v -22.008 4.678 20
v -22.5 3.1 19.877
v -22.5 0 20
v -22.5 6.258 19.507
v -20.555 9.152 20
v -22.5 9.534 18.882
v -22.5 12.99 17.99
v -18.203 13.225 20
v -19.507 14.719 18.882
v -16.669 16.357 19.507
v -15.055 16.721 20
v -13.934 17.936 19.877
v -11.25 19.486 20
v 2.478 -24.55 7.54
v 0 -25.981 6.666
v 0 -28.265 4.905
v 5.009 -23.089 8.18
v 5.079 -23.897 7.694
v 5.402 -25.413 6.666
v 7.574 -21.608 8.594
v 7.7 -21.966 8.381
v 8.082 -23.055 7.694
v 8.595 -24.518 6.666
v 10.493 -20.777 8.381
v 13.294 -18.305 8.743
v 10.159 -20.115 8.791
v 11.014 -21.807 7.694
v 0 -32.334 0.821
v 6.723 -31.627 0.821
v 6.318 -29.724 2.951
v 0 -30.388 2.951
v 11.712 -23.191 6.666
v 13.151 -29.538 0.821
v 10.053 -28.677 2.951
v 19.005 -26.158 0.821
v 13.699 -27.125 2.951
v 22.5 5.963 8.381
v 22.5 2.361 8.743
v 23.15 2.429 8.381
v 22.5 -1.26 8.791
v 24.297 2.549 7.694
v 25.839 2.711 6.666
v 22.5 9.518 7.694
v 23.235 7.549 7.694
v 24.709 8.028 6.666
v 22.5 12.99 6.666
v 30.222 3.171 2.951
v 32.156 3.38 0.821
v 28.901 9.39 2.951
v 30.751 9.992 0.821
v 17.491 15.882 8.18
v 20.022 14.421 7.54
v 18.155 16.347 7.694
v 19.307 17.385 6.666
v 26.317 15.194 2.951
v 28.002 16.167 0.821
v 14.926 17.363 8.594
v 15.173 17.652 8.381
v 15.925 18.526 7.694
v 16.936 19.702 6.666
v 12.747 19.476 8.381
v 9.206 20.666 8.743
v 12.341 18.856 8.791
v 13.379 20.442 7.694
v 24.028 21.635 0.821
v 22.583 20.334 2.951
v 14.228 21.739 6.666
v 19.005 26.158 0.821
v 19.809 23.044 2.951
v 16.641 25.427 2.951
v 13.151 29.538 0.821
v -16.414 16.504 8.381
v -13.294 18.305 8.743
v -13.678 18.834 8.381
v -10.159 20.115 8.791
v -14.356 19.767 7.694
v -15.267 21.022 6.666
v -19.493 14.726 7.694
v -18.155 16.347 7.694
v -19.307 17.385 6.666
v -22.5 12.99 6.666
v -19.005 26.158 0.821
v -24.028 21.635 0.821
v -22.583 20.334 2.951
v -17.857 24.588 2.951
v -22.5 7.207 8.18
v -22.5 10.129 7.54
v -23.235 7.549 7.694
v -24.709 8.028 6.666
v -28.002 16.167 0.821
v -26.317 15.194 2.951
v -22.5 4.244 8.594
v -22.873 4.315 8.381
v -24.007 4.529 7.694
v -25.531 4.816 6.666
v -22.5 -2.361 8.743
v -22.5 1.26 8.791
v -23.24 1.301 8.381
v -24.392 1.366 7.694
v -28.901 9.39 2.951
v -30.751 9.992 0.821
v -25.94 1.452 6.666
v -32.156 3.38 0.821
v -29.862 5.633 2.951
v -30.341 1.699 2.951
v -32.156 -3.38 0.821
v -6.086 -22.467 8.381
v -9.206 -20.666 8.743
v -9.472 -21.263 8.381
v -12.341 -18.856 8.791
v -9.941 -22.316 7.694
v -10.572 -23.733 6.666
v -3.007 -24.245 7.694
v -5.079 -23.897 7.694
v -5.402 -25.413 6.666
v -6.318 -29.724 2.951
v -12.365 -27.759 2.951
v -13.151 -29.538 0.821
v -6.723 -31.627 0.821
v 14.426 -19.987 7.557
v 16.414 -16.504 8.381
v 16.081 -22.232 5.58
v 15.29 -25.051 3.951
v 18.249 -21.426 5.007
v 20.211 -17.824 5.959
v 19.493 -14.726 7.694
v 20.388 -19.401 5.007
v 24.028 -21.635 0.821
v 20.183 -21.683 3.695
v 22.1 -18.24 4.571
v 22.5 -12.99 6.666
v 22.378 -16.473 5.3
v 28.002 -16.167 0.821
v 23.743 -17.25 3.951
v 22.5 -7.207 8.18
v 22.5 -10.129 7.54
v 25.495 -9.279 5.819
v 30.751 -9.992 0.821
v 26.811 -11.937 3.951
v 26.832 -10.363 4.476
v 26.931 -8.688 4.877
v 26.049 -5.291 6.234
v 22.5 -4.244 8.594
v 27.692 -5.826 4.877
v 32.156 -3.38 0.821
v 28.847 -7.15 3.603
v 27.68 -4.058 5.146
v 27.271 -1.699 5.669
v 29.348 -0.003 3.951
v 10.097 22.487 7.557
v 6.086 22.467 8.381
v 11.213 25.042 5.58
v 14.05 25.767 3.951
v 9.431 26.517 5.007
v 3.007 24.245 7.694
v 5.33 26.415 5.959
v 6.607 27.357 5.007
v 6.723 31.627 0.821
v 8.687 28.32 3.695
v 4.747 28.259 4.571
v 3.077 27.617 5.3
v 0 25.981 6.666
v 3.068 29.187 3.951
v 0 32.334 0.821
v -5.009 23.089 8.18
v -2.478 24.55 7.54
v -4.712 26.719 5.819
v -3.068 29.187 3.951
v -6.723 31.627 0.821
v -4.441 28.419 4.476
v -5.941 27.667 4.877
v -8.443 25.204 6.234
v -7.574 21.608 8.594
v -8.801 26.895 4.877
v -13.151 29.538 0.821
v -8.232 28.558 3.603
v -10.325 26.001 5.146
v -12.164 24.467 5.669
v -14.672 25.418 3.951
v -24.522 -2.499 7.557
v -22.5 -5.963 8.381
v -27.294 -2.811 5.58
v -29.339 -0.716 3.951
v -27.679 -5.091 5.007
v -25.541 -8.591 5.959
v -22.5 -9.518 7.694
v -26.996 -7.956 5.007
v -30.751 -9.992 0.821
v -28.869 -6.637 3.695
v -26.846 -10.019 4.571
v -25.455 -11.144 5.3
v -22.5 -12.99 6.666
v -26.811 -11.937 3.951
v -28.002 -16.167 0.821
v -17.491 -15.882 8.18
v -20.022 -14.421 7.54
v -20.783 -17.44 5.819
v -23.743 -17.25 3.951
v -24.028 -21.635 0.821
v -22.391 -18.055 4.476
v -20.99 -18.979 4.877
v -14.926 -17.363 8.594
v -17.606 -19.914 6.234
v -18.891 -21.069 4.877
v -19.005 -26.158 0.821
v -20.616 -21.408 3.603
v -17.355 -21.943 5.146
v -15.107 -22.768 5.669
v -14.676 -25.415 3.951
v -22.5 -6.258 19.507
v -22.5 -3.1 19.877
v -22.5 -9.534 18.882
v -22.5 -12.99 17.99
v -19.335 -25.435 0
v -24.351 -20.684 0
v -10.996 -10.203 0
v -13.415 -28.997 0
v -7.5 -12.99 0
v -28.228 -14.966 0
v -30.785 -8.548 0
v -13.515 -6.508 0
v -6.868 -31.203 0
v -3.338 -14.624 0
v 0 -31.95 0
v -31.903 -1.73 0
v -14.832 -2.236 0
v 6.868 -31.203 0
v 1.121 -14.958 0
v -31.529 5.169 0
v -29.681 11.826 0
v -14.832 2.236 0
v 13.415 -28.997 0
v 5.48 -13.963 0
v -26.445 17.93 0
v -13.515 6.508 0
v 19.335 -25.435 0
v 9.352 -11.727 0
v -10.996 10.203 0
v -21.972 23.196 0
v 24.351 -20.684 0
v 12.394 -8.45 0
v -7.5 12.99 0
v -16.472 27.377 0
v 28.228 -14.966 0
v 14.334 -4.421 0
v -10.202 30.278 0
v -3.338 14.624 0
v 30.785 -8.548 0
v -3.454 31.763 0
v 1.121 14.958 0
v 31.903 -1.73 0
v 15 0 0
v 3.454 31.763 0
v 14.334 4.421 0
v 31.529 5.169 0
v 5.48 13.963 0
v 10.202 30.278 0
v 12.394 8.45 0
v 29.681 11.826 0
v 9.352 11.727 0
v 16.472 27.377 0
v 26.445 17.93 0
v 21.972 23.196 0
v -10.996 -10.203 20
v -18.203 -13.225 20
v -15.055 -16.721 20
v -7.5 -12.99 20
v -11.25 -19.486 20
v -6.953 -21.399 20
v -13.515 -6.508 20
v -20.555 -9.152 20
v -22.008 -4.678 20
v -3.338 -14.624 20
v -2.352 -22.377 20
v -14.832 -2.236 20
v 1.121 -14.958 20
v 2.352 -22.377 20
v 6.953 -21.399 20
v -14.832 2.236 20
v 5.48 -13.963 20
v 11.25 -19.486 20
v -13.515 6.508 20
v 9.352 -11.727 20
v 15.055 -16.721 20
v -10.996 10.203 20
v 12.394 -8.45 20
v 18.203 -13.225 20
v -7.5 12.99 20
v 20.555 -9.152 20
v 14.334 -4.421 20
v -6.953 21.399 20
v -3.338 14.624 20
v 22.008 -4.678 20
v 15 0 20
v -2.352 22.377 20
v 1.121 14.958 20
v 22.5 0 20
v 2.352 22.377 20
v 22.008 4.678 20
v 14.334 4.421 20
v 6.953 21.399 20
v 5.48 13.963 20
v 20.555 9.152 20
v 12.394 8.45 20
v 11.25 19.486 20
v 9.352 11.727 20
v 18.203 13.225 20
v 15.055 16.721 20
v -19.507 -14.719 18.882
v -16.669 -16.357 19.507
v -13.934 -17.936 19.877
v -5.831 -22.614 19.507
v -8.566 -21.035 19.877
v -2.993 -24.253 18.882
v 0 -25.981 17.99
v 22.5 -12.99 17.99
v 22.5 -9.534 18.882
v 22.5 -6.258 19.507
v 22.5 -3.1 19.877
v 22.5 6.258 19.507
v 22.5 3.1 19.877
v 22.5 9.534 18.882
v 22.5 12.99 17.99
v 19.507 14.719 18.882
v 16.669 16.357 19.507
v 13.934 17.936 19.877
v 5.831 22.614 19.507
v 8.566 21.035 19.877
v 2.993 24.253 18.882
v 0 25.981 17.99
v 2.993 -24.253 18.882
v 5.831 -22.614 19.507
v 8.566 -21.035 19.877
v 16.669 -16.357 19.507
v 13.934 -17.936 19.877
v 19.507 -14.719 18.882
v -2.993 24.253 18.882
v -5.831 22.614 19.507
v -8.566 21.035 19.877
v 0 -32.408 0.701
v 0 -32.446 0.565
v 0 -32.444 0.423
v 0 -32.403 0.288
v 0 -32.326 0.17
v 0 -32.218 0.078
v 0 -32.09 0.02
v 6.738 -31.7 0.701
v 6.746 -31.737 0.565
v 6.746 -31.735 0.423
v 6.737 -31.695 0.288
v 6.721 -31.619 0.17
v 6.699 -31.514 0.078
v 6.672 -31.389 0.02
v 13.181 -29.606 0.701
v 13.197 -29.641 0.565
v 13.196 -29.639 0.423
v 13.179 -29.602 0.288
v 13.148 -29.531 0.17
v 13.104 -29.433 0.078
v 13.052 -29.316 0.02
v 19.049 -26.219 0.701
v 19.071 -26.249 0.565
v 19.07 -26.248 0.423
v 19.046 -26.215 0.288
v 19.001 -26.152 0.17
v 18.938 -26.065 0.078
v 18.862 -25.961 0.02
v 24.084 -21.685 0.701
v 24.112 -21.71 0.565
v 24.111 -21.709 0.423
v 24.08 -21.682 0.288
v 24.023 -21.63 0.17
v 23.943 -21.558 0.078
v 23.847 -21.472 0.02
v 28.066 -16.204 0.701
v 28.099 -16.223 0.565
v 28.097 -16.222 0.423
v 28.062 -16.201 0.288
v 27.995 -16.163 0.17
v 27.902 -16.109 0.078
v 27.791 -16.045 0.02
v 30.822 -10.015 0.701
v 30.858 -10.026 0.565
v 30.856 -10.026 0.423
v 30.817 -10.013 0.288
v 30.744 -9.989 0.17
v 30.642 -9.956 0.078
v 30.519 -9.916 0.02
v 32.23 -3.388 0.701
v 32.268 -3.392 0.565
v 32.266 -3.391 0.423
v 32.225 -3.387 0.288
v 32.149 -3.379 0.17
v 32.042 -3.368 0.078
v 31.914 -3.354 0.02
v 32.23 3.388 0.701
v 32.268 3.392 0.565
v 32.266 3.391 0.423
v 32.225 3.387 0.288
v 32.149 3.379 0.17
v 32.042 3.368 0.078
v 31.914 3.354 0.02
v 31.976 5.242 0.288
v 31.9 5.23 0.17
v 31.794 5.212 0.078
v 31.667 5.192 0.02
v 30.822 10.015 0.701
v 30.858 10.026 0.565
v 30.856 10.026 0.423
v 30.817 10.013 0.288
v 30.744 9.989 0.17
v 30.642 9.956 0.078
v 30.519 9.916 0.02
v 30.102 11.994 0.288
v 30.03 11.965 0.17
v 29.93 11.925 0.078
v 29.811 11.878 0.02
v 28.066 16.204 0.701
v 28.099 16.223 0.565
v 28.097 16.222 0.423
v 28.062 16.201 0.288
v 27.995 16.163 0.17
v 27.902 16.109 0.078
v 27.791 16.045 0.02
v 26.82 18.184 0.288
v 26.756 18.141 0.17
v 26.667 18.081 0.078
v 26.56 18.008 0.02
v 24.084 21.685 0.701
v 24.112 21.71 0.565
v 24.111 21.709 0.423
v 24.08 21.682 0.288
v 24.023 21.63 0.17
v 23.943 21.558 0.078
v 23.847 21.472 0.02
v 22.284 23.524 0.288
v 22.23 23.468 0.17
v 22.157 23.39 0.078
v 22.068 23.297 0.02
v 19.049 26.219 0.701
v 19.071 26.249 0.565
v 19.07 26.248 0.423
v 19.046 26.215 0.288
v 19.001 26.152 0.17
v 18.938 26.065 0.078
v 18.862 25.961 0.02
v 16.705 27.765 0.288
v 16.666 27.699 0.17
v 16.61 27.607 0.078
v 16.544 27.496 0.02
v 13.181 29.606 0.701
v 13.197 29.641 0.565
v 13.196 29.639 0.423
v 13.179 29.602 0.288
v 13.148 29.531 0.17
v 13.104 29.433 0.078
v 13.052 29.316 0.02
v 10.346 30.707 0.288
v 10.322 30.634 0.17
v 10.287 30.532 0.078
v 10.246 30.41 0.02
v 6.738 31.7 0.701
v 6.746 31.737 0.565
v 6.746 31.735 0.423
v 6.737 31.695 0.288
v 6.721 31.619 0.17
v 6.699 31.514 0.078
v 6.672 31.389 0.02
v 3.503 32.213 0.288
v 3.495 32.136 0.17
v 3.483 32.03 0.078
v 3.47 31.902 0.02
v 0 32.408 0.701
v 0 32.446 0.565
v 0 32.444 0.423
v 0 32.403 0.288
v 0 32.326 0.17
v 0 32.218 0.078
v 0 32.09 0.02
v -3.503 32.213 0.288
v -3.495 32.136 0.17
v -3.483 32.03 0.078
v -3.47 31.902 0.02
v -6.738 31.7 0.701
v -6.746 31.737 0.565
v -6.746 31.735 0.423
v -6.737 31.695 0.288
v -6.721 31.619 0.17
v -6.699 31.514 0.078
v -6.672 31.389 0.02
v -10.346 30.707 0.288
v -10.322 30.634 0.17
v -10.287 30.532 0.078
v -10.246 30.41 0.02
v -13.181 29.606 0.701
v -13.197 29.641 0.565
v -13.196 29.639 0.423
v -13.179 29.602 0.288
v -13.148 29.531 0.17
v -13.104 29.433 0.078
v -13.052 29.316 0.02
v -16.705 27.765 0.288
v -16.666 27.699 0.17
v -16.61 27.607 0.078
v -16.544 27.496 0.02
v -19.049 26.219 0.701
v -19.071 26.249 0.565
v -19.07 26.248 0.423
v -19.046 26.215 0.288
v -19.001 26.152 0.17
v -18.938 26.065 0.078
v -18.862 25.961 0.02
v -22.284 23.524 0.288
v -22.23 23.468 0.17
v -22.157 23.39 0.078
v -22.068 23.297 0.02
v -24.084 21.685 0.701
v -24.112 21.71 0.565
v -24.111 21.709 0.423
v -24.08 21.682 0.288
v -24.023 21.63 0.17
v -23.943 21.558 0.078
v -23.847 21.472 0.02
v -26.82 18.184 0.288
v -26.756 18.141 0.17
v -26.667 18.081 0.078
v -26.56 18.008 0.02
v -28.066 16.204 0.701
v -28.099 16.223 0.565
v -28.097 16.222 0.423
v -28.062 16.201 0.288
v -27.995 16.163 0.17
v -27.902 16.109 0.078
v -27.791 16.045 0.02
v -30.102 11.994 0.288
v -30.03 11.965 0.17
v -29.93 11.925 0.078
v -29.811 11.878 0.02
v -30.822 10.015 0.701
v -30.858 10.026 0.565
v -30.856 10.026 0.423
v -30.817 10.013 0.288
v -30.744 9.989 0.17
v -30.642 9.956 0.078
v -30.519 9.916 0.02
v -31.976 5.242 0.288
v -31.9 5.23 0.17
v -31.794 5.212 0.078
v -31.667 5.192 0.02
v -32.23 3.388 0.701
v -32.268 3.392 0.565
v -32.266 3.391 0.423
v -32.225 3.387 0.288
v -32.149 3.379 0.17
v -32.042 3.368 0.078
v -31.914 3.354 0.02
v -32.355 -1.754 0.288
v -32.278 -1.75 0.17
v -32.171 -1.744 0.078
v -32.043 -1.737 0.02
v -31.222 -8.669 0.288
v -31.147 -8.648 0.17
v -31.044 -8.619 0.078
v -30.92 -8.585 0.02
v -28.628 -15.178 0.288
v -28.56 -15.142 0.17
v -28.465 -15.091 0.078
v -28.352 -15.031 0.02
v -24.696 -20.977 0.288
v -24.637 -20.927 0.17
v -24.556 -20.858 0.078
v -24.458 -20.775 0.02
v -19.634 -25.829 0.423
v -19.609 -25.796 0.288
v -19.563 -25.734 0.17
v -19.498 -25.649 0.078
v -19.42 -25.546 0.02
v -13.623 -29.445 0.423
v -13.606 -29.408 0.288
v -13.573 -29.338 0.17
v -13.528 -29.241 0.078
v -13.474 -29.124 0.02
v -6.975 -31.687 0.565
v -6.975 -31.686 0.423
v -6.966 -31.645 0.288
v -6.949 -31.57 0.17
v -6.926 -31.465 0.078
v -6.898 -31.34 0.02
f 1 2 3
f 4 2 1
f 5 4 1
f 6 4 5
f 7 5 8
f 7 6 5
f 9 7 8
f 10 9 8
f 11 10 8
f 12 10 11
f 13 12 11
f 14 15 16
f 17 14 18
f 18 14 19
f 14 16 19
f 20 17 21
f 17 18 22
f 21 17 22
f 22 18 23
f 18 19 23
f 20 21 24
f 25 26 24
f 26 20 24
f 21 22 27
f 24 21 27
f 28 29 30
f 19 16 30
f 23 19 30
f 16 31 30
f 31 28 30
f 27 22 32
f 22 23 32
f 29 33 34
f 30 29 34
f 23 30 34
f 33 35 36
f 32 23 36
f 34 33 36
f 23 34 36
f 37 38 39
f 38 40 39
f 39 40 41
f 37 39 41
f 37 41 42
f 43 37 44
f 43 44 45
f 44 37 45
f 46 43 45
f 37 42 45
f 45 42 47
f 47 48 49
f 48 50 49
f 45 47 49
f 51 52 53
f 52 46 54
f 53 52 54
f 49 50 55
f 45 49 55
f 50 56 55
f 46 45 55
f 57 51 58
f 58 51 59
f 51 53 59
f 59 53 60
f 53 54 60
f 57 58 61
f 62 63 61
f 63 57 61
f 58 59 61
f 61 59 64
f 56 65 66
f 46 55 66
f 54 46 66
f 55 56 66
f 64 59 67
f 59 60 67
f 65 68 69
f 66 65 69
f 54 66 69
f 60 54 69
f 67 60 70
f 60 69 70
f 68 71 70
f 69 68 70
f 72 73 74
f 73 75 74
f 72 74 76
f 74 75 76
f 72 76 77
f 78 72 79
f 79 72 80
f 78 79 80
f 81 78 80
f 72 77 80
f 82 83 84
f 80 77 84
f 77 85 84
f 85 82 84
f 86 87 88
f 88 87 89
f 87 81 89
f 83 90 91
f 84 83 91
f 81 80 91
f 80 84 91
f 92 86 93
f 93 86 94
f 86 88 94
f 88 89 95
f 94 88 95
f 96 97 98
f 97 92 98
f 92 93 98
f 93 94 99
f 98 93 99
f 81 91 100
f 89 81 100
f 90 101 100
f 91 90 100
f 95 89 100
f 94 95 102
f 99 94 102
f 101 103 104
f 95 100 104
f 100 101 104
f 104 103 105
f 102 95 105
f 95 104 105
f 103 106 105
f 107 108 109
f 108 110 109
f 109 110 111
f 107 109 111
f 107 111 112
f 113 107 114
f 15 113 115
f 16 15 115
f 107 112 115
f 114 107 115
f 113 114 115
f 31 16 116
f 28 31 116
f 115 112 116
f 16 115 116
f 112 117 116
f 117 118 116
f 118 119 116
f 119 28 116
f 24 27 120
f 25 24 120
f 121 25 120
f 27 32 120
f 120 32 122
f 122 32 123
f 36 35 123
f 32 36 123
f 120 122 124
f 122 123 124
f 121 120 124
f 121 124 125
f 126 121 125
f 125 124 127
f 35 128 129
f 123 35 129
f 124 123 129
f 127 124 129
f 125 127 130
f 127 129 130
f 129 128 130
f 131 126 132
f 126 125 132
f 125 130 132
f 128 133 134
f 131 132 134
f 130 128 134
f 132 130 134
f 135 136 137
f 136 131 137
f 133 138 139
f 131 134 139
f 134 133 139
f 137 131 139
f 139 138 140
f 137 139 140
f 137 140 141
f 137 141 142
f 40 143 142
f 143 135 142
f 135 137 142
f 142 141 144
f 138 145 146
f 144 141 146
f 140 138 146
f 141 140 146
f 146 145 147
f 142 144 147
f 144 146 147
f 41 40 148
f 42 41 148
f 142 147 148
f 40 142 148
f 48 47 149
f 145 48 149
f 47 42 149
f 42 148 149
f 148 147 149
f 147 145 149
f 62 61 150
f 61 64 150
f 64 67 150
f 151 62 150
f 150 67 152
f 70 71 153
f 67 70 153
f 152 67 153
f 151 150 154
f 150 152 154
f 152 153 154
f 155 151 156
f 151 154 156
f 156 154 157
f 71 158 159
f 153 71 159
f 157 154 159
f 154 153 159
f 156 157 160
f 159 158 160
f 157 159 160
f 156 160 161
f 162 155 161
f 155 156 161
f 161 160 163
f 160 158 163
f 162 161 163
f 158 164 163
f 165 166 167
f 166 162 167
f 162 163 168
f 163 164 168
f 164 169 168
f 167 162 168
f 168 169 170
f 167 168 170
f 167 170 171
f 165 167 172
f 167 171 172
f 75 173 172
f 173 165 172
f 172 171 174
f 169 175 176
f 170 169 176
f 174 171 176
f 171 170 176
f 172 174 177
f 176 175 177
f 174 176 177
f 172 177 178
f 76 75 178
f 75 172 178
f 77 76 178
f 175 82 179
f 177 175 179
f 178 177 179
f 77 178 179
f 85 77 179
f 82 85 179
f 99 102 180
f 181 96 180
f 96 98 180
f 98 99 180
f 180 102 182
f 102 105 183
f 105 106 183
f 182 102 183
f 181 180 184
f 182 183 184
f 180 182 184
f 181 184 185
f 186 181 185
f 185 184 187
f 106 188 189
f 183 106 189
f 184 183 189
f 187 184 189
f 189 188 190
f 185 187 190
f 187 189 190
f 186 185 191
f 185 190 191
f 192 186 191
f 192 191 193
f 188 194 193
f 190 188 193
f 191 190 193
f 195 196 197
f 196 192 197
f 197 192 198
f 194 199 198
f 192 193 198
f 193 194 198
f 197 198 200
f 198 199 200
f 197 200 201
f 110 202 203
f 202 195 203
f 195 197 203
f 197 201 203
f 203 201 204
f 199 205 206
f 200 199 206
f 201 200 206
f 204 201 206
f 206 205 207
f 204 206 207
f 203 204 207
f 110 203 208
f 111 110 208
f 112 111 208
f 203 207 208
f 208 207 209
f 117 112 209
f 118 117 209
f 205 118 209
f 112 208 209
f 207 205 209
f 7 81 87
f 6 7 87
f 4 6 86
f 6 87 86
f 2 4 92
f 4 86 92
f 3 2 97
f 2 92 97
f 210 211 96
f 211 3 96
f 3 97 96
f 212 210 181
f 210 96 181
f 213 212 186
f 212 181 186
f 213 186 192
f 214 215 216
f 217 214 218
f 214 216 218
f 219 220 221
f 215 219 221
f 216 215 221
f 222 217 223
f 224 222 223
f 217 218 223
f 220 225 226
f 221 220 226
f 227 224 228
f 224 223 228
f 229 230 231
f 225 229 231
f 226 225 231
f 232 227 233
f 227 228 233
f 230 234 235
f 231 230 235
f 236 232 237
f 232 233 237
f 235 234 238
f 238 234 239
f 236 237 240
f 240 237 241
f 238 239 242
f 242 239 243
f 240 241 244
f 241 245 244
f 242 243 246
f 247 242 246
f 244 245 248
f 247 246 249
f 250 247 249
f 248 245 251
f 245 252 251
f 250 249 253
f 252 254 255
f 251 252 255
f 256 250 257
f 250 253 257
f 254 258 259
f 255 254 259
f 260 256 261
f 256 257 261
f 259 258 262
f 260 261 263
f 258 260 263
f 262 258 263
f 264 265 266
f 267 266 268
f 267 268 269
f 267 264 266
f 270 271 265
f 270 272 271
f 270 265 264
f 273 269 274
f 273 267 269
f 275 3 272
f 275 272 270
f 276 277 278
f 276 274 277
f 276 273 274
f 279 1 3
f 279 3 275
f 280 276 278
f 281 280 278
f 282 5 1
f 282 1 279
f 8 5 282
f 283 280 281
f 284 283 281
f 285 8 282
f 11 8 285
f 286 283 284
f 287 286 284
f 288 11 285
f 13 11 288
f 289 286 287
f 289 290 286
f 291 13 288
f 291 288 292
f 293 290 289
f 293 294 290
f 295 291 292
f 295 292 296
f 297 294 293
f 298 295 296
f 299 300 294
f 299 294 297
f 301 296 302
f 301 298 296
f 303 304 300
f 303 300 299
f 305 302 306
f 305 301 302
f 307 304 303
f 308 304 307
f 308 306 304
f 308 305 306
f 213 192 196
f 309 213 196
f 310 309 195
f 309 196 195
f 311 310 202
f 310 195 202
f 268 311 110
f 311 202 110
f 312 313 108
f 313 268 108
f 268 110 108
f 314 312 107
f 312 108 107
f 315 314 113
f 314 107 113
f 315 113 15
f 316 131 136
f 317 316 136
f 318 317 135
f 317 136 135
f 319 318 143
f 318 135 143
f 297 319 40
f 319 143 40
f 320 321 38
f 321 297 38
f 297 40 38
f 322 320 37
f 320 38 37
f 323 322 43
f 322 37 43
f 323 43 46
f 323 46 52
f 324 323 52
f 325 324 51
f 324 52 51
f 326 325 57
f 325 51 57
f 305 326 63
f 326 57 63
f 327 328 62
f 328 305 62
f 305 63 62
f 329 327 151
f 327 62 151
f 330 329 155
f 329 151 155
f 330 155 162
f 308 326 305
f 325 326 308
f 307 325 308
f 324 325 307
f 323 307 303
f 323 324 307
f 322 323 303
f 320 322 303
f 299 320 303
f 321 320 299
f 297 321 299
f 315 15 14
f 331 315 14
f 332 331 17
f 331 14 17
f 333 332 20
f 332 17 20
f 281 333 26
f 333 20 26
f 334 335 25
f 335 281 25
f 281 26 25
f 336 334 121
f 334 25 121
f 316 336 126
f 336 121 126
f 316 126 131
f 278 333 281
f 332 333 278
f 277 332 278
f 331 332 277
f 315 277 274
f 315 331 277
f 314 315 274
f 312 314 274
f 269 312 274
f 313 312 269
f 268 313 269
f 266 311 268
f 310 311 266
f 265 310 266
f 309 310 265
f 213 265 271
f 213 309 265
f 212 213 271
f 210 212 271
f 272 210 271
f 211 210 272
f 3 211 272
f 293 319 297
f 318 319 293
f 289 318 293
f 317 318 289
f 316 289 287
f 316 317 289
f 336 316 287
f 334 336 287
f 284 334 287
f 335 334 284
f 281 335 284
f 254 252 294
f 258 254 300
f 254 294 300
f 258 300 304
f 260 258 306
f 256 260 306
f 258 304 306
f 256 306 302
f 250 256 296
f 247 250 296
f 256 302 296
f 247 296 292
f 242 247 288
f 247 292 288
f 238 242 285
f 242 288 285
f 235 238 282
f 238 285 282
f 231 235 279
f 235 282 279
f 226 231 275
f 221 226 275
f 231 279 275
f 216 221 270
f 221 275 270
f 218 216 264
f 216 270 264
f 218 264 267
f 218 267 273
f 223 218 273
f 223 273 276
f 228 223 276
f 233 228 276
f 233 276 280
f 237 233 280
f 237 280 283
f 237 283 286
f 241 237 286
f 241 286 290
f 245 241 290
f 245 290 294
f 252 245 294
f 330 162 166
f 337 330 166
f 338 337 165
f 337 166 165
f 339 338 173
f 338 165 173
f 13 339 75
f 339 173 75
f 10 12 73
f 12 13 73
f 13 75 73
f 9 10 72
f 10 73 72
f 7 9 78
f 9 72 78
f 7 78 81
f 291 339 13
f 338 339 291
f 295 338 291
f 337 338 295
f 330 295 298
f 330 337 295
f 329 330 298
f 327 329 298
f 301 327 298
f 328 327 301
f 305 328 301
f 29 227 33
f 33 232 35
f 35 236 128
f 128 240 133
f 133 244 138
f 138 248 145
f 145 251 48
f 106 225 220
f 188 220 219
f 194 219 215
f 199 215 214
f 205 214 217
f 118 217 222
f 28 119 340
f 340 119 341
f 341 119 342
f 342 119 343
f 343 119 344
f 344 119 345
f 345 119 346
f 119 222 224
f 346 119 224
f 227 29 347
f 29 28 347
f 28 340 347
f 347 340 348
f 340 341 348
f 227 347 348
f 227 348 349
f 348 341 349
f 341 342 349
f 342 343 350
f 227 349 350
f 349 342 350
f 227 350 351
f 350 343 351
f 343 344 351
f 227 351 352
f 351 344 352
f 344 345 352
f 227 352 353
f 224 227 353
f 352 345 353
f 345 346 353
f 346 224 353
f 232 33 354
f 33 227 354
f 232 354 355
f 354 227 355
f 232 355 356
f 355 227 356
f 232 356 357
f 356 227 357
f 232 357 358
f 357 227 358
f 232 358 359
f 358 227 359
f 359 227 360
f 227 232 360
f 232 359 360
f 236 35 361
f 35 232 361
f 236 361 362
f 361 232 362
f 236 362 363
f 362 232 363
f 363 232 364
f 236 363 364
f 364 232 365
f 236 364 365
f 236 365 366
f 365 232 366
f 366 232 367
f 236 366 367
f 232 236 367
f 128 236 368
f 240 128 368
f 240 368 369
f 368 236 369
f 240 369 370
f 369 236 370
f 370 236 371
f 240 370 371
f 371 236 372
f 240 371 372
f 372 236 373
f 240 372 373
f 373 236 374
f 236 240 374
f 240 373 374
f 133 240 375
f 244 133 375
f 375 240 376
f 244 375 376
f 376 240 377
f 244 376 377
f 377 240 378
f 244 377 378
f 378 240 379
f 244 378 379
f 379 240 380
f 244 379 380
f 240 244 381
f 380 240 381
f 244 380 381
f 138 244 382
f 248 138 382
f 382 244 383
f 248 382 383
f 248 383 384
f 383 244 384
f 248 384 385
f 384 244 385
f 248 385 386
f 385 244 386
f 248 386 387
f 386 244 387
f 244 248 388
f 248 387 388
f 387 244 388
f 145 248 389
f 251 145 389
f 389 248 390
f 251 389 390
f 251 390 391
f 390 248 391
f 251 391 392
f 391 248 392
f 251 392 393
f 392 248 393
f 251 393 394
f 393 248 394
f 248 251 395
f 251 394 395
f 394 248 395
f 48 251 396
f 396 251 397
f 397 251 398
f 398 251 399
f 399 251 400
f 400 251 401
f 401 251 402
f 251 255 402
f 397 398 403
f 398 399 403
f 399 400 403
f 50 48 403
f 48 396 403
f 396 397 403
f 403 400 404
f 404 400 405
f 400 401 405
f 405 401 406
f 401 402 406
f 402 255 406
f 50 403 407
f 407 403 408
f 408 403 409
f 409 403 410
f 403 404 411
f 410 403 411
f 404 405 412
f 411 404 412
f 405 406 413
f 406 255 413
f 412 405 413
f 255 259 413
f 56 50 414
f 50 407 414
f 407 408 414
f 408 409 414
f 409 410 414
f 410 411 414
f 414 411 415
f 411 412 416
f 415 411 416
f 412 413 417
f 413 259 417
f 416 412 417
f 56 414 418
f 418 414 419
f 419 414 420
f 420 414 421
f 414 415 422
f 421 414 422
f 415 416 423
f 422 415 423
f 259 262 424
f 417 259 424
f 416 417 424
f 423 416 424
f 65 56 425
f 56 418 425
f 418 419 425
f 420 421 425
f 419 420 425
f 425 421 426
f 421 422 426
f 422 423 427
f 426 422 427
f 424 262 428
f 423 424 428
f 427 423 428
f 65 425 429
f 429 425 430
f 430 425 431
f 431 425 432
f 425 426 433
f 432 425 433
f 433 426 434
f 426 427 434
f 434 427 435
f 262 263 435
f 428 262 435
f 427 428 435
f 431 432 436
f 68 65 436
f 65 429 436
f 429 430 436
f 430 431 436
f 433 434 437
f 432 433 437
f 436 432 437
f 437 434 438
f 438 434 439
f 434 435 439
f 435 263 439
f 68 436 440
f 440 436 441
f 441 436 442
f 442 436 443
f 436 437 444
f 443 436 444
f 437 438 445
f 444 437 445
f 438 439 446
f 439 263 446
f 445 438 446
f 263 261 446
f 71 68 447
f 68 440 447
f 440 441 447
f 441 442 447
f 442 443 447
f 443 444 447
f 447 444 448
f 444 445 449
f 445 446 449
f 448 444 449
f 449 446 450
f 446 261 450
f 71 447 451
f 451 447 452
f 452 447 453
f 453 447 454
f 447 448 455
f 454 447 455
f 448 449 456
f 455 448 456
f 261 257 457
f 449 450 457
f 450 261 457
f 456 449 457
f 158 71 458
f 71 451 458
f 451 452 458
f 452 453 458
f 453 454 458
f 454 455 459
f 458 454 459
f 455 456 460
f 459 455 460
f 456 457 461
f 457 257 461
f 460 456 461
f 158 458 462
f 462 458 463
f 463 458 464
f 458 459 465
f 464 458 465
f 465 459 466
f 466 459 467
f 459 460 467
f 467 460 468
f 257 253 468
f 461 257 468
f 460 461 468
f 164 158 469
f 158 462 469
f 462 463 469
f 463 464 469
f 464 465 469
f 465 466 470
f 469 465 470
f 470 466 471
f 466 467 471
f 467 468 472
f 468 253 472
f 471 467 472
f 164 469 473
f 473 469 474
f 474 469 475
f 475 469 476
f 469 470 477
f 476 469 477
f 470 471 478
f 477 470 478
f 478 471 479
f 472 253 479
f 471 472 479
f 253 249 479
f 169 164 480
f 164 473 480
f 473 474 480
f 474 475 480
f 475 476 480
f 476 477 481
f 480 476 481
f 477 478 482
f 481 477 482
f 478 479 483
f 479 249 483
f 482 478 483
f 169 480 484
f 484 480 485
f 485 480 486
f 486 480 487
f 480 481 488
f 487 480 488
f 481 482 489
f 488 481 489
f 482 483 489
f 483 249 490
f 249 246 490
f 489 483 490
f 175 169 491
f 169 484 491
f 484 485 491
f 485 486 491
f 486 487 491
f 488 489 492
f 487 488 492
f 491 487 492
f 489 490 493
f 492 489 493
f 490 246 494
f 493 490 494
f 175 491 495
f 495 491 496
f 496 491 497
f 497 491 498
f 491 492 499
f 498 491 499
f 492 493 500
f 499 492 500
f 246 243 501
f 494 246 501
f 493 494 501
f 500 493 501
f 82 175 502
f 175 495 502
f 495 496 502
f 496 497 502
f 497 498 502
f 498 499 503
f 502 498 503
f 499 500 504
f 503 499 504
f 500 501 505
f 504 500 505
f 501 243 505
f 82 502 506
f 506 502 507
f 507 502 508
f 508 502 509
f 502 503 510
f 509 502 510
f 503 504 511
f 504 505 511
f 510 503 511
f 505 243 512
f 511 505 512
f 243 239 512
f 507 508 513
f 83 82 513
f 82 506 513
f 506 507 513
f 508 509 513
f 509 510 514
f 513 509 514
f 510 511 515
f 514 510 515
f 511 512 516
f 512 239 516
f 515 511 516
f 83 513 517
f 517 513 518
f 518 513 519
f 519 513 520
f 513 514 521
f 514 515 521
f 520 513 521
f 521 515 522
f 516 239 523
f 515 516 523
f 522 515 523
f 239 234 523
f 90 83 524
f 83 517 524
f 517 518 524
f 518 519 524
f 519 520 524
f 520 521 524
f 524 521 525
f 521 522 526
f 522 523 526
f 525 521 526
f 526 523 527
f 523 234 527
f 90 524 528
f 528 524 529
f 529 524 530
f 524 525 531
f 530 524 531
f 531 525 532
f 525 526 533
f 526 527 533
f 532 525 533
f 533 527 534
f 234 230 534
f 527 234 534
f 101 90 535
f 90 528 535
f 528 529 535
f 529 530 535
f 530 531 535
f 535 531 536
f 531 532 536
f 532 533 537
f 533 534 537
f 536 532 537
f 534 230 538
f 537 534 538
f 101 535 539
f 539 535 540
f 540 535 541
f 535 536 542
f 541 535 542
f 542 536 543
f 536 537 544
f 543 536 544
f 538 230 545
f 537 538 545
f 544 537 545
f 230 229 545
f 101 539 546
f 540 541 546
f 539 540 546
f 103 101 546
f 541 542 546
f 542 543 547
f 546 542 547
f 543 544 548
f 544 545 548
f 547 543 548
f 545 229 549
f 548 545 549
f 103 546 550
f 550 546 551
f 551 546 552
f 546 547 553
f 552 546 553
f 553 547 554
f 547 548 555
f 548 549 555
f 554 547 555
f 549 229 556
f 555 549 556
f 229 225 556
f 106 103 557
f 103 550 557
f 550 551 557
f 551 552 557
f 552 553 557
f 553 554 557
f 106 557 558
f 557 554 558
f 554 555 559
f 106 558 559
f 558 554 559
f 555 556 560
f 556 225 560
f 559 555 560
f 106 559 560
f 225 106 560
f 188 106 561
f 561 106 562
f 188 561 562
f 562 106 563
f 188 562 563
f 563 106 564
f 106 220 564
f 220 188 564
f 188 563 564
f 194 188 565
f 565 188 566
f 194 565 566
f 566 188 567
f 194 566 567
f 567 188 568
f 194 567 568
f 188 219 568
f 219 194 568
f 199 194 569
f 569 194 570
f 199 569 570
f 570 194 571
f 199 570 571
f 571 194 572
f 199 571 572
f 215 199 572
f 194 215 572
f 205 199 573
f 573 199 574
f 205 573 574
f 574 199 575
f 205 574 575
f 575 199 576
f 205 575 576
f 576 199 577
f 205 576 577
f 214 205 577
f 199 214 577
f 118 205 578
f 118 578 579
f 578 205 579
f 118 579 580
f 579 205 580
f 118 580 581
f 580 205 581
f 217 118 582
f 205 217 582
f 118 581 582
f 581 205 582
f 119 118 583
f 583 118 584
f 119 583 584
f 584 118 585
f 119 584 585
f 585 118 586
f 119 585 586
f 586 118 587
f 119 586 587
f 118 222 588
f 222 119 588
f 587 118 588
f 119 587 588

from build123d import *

# Parameters (mm, degrees)
BOSS_EXTRUDE1_DEPTH = 20
SKETCH5_OUTSIDE_W   = 154.97
SKETCH5_OUTSIDE_H   = 154.97
SKETCH5_OUTSIDE_R   = 22.5
CUT_EXTRUDE1_DEPTH  = 20
CUT_EXTRUDE1_TAPER  = 60
SKETCH6_R           = 15
CUT_EXTRUDE2_DEPTH  = 21


with BuildPart() as part:
    # Sketch1 → Boss-Extrude1 (new body)
    with BuildSketch(Plane.XY):
        Polygon((22.5, -12.990381057), (22.5, 12.990381057), (0, 25.980762114), (-22.5, 12.990381057), (-22.5, -12.990381057), (0, -25.980762114), align=None)
    extrude(amount=BOSS_EXTRUDE1_DEPTH)

    # Sketch2 → Revolve1 (revolve)
    with BuildSketch(Plane(origin=(0, 0, 0), x_dir=(0, 0, -1), z_dir=(1, 0, 0))):
        with BuildLine():
            Line((0, 0), (-12, 0))
            ThreePointArc((-12, 0), (-10.89665903, -17.717879555), (-0.820783292, -32.333533674))
            ThreePointArc((-0.820783292, -32.333533674), (-0.288330028, -32.402985456), (0, -31.95))
            Line((0, -31.95), (0, 0))
        make_face()
    revolve(axis=Axis((0, 0, 0), (0, 0, 1)))

    # Sketch5 outside → Cut-Extrude1 (cut)
    with BuildSketch(Plane.XY.offset(20)):
        Rectangle(SKETCH5_OUTSIDE_W, SKETCH5_OUTSIDE_H)
        Circle(SKETCH5_OUTSIDE_R, mode=Mode.SUBTRACT)
    extrude(amount=-CUT_EXTRUDE1_DEPTH, taper=CUT_EXTRUDE1_TAPER, mode=Mode.SUBTRACT)

    # Sketch6 → Cut-Extrude2 (cut, through all)
    with BuildSketch(Plane.XY.offset(20)):
        Circle(SKETCH6_R)
    extrude(amount=-CUT_EXTRUDE2_DEPTH, mode=Mode.SUBTRACT)


solid = part.part
